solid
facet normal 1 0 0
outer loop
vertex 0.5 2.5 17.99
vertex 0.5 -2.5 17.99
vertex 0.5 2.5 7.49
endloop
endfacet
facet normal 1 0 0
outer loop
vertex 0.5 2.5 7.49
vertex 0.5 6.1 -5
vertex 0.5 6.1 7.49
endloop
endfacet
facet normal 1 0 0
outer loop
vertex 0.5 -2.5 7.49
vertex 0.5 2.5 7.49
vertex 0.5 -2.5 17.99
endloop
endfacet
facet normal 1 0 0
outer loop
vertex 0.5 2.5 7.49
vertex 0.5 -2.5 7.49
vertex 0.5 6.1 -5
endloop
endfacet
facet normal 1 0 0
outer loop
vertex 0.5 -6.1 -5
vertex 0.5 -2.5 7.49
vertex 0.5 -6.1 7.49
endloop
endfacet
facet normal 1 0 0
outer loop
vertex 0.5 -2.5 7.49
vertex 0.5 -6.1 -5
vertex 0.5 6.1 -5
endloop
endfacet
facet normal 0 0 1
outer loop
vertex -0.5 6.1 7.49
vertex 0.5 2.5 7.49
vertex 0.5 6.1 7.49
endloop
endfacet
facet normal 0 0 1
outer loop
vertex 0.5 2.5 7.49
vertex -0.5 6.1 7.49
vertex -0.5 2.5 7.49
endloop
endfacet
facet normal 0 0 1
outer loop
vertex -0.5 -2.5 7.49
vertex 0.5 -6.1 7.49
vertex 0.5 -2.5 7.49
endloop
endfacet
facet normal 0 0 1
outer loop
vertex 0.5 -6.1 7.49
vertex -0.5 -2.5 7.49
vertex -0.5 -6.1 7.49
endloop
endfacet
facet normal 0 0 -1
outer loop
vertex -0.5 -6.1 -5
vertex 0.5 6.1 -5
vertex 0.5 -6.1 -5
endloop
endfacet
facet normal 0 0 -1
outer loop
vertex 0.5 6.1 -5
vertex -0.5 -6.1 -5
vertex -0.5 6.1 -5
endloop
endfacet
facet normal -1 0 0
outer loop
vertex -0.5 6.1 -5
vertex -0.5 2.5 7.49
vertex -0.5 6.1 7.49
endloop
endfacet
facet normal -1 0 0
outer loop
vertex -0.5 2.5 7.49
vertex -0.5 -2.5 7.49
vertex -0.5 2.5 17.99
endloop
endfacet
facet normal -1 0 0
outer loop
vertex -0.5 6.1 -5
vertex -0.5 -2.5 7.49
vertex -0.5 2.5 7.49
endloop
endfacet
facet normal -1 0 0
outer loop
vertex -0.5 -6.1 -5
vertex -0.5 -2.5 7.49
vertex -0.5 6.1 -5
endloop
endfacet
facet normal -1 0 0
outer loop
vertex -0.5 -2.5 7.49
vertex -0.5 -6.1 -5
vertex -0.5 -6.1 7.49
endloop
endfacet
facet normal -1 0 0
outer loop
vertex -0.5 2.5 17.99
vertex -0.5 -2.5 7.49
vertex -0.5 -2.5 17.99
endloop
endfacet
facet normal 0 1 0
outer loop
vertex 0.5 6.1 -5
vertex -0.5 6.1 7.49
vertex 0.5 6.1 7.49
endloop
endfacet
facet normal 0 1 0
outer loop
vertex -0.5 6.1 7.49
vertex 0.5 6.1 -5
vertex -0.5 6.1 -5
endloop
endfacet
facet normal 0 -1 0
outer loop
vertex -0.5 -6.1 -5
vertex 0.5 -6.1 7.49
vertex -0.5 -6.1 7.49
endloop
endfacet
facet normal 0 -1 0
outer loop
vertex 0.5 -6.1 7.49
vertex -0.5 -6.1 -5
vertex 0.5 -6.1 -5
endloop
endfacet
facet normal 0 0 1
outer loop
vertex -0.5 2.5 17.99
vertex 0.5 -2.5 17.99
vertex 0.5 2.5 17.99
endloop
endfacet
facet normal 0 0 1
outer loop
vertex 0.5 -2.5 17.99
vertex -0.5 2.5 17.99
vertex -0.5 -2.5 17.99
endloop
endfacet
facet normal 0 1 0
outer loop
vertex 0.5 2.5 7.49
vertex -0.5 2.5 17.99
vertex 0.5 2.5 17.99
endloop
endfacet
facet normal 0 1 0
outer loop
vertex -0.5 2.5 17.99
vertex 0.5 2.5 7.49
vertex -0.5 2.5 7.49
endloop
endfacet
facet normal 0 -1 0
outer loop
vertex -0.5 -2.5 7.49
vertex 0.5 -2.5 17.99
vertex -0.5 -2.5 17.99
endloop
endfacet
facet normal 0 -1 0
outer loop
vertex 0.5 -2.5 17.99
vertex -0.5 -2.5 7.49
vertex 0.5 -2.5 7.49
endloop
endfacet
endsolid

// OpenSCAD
// Battery tabs for holding AA and similar sized batterys.
// Built for Keystone Electronics parts 5201 and 5223.
// 5201: https://www.keyelco.com/product-pdf.cfm?p=900
// 5223: https://www.keyelco.com/product-pdf.cfm?p=910


// TODO: function to return array for polygon? Is that useful?
// function battery_tab_size() = [1.45,11.20,11.99];

module battery_tab() {
  difference() {
    union() {
      // TODO: round corners?
      cube(size=[0.5, 11.2, 11.99]);
      translate([0, 11.2/2 - 3/2, 11.99])
        cube(size=[0.5, 3, 6.35]);
      translate([0.5, 11.2/2, 5]) {
        rotate([0, 90, 0]) {
          cylinder(h=1.45, r1=5.99/2, r2=3.99/2);
        }
      }
      translate([0.5, 11.2/2, 10.74]) {
        rotate([0, 90, 0]) {
          cylinder(r=2.49/2, h=0.5);
        }
      }
    }

    translate([-0.5, 11.2/2, 18.34-1.5]) {
      rotate([0, 90, 0]) {
        cylinder(r=1.7/2, h=2);
      }
    }
    translate([-0.5, 11.2/2, 10.74]) {
      rotate([0, 90, 0]) {
        cylinder(r=1.52/2, h=2);
      }
    }
  }
}

// function battery_tab_cutout_size() = [1,11.5,12.5];
// Cutout is the foot print of the tab, with padding on y and z.
// Also, Need a sane way to return where the battery aligns.
module battery_tab_cutout(center=false, vpin=false, extend=0) {
  // If center, put the center of the button onto 0,0,0
  // If vpin, add a tall skinny cylinder to visualize where the center is.
  // If extend, 'pull' an edge of the tab that far to allow for inserting the actual tab
  sze=[1, 11.2 + 1, 11.99 + 0.5];
  offset=center?[-0.5,-sze[1]/2,-5]:[0,0,0];
  translate(offset) {
    cube(size=sze);
    if (extend > 0) {
      translate([0, 0, -sze[2]+1]) {
        cube(size=sze);
      }
    }
    if (vpin) {
      translate([0, sze[1]/2, sze[2]/2]) {
        rotate([0, 90, 0]) {
          cylinder(r=0.5, h=20, center=true);
        }
      }
    }
    translate([0, sze[1]/2 - 2.5, sze[2]-0.5]) {
      cube(size=[1, 5, 11]);
    }
  }
}

battery_tab_cutout(center=true, $fs=0.5);
